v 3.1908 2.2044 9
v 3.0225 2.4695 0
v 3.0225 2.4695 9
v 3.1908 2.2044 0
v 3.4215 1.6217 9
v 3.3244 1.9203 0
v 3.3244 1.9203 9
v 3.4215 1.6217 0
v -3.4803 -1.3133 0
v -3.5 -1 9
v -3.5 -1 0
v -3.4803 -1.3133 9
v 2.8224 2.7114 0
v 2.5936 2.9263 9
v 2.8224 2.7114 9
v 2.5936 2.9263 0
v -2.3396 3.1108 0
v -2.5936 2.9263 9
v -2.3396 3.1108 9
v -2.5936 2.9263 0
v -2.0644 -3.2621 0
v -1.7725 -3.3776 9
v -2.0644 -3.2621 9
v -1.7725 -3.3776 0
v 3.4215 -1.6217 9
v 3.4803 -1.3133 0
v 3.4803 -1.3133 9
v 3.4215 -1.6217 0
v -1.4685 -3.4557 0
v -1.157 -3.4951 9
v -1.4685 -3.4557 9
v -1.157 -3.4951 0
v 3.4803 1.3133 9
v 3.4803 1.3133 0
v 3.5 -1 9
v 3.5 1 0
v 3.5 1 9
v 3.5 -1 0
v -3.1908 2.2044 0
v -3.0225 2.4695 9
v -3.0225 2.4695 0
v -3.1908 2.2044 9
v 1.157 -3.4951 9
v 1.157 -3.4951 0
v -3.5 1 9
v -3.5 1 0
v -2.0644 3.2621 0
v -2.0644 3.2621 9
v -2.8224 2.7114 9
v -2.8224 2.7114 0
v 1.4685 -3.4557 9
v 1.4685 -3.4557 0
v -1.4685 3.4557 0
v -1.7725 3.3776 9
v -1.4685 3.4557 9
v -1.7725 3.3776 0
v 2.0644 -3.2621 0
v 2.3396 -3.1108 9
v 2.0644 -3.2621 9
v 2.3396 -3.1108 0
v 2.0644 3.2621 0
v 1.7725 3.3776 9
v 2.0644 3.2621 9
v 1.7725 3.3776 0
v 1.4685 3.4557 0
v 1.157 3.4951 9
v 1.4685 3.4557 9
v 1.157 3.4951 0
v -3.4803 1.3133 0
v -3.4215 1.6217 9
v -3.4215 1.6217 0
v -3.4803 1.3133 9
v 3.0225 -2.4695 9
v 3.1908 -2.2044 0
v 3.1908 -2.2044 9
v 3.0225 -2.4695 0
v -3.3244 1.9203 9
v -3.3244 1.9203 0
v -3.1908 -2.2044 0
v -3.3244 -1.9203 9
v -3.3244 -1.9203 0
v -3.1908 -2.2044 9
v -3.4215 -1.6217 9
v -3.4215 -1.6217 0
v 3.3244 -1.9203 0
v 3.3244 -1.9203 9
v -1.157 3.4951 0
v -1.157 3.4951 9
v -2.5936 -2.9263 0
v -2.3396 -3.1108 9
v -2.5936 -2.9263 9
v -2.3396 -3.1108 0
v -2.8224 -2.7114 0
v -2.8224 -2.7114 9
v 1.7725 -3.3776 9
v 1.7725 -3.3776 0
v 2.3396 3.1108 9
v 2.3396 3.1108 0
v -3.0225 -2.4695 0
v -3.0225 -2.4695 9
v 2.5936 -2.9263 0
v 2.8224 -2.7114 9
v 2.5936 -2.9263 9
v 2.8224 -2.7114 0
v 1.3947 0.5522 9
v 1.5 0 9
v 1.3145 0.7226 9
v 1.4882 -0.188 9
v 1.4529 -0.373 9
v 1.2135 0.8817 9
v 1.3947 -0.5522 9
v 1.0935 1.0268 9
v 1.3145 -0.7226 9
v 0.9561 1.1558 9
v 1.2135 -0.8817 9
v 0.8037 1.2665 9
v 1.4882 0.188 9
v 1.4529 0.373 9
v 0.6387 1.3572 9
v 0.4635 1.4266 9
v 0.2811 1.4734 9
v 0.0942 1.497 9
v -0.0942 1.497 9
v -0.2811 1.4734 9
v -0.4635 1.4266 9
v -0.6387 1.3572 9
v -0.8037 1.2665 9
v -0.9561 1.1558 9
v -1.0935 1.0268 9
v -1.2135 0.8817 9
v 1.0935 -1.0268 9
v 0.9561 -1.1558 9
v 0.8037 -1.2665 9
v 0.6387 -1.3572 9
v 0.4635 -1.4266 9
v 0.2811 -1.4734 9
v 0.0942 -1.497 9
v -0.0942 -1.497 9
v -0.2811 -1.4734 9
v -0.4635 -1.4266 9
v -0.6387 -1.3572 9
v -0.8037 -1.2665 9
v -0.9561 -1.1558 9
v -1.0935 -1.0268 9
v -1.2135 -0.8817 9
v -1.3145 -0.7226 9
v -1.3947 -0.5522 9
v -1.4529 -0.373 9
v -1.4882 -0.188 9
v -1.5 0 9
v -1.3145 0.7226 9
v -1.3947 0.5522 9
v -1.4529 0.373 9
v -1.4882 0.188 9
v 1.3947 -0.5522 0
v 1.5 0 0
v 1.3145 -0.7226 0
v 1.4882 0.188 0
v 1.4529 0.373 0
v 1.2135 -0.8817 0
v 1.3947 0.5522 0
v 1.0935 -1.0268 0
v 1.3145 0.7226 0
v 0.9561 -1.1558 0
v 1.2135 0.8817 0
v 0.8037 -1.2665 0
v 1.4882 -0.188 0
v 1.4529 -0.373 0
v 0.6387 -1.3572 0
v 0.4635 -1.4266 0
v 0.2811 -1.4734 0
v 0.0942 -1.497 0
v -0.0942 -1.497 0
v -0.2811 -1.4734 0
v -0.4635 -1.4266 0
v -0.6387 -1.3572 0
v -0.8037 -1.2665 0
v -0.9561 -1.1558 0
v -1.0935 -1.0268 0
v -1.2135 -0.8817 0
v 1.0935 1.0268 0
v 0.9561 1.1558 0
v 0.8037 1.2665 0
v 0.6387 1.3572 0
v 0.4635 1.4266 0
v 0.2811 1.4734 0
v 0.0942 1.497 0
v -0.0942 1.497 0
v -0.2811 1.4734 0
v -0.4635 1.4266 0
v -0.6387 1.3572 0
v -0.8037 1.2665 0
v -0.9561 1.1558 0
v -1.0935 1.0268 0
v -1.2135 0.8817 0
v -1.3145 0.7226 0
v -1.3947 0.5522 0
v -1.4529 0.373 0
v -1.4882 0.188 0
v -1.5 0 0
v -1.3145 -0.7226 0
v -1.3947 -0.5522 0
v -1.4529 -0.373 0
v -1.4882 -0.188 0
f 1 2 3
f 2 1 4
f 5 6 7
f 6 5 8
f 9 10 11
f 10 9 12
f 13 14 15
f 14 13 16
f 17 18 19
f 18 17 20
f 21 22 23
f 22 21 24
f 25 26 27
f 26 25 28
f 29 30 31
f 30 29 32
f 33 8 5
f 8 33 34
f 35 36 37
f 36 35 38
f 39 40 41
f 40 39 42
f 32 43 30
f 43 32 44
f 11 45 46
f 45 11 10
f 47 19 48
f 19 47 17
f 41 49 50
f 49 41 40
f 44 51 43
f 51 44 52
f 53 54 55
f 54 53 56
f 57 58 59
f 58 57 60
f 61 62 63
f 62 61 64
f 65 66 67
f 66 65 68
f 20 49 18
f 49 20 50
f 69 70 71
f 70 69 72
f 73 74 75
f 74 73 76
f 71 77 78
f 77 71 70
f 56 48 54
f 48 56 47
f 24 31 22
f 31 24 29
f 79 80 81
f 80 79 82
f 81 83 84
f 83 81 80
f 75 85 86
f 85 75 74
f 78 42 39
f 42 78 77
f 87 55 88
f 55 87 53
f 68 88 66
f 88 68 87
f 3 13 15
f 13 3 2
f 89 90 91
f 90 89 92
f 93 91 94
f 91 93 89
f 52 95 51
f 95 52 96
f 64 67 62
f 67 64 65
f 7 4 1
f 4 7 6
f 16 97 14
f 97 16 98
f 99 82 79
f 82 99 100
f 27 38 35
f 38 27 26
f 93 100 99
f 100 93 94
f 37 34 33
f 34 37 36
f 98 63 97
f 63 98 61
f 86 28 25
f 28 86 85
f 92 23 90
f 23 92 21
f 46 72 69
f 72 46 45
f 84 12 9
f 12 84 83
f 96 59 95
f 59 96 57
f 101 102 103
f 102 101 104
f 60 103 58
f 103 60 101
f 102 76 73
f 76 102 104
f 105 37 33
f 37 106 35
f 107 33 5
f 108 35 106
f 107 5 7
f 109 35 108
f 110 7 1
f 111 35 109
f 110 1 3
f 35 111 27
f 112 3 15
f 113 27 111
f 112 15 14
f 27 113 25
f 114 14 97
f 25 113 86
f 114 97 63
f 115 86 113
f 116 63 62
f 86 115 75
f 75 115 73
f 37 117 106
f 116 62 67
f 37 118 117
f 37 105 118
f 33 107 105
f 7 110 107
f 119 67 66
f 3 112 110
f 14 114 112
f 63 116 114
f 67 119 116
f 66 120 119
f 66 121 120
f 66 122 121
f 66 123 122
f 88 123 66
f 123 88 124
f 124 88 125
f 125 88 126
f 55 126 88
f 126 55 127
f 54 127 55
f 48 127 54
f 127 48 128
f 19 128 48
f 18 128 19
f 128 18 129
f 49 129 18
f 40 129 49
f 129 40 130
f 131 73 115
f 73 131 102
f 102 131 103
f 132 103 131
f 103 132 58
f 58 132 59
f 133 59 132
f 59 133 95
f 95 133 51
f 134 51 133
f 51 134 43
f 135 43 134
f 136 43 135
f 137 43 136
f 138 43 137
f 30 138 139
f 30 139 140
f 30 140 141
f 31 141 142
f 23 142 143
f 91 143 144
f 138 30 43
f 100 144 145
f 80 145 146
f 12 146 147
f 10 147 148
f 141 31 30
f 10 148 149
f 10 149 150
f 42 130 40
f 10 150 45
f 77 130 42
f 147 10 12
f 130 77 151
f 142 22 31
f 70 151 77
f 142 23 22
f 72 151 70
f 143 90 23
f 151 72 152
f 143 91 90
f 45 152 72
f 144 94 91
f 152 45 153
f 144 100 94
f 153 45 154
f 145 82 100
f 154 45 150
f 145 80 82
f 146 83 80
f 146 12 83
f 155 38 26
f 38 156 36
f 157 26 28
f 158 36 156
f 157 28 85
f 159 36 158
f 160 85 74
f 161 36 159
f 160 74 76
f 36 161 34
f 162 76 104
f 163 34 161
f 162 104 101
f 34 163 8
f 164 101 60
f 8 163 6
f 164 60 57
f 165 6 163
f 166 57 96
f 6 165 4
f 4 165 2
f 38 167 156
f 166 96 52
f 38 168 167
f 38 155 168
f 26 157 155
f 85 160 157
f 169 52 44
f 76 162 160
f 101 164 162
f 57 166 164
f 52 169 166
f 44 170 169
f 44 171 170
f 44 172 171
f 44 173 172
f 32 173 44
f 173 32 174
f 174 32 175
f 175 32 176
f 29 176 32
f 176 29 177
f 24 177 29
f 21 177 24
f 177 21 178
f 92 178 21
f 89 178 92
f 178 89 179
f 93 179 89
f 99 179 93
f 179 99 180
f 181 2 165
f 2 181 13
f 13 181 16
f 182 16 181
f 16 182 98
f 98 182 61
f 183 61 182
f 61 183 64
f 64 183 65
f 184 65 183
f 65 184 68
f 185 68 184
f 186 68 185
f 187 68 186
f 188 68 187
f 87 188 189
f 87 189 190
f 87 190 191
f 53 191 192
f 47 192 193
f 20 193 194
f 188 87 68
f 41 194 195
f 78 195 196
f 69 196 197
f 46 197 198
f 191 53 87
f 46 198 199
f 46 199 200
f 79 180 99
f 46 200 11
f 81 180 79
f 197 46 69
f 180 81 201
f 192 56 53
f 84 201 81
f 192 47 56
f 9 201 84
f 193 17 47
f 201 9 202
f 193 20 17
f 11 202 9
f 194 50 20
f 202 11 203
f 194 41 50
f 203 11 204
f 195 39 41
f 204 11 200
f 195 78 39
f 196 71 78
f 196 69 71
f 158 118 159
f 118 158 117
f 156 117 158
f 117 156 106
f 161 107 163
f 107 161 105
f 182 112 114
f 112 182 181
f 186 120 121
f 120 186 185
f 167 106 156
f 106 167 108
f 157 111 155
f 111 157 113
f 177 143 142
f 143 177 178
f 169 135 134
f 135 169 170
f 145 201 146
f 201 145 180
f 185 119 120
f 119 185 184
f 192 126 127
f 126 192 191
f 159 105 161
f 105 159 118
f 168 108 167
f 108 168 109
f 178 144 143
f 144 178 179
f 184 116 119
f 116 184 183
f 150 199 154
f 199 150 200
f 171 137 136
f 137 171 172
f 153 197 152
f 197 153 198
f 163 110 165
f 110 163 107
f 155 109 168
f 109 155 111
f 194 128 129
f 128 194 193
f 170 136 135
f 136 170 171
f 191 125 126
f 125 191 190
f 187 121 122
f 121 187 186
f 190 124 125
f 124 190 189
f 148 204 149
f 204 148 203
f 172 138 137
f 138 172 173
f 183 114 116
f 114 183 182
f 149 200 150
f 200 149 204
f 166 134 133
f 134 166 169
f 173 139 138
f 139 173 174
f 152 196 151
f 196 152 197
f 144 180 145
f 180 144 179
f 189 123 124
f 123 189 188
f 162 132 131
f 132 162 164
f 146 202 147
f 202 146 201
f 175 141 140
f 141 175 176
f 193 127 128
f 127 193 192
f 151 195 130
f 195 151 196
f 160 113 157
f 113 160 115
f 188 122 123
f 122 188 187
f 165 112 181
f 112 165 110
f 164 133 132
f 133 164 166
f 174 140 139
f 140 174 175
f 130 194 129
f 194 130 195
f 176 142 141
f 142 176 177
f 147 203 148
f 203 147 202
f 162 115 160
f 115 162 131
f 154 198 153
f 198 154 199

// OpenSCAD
$fn = 50;


difference() {
	union() {
		translate(v = [0, 0, 0]) {
			rotate(a = [0, 0, 0]) {
				hull() {
					translate(v = [-1.0000000000, 1.0000000000, 0]) {
						rotate(a = [0, 0, 0]) {
							translate(v = [0, 0, 0]) {
								rotate(a = [0, 0, 0]) {
									cylinder(h = 9, r = 2.5000000000);
								}
							}
						}
					}
					translate(v = [1.0000000000, 1.0000000000, 0]) {
						rotate(a = [0, 0, 0]) {
							translate(v = [0, 0, 0]) {
								rotate(a = [0, 0, 0]) {
									cylinder(h = 9, r = 2.5000000000);
								}
							}
						}
					}
					translate(v = [-1.0000000000, -1.0000000000, 0]) {
						rotate(a = [0, 0, 0]) {
							translate(v = [0, 0, 0]) {
								rotate(a = [0, 0, 0]) {
									cylinder(h = 9, r = 2.5000000000);
								}
							}
						}
					}
					translate(v = [1.0000000000, -1.0000000000, 0]) {
						rotate(a = [0, 0, 0]) {
							translate(v = [0, 0, 0]) {
								rotate(a = [0, 0, 0]) {
									cylinder(h = 9, r = 2.5000000000);
								}
							}
						}
					}
				}
			}
		}
	}
	union() {
		translate(v = [0.0000000000, 0.0000000000, 0]) {
			rotate(a = [0, 0, 0]) {
				translate(v = [0, 0, -50]) {
					rotate(a = [0, 0, 0]) {
						cylinder(h = 100, r = 1.5000000000);
					}
				}
			}
		}
	}
}
